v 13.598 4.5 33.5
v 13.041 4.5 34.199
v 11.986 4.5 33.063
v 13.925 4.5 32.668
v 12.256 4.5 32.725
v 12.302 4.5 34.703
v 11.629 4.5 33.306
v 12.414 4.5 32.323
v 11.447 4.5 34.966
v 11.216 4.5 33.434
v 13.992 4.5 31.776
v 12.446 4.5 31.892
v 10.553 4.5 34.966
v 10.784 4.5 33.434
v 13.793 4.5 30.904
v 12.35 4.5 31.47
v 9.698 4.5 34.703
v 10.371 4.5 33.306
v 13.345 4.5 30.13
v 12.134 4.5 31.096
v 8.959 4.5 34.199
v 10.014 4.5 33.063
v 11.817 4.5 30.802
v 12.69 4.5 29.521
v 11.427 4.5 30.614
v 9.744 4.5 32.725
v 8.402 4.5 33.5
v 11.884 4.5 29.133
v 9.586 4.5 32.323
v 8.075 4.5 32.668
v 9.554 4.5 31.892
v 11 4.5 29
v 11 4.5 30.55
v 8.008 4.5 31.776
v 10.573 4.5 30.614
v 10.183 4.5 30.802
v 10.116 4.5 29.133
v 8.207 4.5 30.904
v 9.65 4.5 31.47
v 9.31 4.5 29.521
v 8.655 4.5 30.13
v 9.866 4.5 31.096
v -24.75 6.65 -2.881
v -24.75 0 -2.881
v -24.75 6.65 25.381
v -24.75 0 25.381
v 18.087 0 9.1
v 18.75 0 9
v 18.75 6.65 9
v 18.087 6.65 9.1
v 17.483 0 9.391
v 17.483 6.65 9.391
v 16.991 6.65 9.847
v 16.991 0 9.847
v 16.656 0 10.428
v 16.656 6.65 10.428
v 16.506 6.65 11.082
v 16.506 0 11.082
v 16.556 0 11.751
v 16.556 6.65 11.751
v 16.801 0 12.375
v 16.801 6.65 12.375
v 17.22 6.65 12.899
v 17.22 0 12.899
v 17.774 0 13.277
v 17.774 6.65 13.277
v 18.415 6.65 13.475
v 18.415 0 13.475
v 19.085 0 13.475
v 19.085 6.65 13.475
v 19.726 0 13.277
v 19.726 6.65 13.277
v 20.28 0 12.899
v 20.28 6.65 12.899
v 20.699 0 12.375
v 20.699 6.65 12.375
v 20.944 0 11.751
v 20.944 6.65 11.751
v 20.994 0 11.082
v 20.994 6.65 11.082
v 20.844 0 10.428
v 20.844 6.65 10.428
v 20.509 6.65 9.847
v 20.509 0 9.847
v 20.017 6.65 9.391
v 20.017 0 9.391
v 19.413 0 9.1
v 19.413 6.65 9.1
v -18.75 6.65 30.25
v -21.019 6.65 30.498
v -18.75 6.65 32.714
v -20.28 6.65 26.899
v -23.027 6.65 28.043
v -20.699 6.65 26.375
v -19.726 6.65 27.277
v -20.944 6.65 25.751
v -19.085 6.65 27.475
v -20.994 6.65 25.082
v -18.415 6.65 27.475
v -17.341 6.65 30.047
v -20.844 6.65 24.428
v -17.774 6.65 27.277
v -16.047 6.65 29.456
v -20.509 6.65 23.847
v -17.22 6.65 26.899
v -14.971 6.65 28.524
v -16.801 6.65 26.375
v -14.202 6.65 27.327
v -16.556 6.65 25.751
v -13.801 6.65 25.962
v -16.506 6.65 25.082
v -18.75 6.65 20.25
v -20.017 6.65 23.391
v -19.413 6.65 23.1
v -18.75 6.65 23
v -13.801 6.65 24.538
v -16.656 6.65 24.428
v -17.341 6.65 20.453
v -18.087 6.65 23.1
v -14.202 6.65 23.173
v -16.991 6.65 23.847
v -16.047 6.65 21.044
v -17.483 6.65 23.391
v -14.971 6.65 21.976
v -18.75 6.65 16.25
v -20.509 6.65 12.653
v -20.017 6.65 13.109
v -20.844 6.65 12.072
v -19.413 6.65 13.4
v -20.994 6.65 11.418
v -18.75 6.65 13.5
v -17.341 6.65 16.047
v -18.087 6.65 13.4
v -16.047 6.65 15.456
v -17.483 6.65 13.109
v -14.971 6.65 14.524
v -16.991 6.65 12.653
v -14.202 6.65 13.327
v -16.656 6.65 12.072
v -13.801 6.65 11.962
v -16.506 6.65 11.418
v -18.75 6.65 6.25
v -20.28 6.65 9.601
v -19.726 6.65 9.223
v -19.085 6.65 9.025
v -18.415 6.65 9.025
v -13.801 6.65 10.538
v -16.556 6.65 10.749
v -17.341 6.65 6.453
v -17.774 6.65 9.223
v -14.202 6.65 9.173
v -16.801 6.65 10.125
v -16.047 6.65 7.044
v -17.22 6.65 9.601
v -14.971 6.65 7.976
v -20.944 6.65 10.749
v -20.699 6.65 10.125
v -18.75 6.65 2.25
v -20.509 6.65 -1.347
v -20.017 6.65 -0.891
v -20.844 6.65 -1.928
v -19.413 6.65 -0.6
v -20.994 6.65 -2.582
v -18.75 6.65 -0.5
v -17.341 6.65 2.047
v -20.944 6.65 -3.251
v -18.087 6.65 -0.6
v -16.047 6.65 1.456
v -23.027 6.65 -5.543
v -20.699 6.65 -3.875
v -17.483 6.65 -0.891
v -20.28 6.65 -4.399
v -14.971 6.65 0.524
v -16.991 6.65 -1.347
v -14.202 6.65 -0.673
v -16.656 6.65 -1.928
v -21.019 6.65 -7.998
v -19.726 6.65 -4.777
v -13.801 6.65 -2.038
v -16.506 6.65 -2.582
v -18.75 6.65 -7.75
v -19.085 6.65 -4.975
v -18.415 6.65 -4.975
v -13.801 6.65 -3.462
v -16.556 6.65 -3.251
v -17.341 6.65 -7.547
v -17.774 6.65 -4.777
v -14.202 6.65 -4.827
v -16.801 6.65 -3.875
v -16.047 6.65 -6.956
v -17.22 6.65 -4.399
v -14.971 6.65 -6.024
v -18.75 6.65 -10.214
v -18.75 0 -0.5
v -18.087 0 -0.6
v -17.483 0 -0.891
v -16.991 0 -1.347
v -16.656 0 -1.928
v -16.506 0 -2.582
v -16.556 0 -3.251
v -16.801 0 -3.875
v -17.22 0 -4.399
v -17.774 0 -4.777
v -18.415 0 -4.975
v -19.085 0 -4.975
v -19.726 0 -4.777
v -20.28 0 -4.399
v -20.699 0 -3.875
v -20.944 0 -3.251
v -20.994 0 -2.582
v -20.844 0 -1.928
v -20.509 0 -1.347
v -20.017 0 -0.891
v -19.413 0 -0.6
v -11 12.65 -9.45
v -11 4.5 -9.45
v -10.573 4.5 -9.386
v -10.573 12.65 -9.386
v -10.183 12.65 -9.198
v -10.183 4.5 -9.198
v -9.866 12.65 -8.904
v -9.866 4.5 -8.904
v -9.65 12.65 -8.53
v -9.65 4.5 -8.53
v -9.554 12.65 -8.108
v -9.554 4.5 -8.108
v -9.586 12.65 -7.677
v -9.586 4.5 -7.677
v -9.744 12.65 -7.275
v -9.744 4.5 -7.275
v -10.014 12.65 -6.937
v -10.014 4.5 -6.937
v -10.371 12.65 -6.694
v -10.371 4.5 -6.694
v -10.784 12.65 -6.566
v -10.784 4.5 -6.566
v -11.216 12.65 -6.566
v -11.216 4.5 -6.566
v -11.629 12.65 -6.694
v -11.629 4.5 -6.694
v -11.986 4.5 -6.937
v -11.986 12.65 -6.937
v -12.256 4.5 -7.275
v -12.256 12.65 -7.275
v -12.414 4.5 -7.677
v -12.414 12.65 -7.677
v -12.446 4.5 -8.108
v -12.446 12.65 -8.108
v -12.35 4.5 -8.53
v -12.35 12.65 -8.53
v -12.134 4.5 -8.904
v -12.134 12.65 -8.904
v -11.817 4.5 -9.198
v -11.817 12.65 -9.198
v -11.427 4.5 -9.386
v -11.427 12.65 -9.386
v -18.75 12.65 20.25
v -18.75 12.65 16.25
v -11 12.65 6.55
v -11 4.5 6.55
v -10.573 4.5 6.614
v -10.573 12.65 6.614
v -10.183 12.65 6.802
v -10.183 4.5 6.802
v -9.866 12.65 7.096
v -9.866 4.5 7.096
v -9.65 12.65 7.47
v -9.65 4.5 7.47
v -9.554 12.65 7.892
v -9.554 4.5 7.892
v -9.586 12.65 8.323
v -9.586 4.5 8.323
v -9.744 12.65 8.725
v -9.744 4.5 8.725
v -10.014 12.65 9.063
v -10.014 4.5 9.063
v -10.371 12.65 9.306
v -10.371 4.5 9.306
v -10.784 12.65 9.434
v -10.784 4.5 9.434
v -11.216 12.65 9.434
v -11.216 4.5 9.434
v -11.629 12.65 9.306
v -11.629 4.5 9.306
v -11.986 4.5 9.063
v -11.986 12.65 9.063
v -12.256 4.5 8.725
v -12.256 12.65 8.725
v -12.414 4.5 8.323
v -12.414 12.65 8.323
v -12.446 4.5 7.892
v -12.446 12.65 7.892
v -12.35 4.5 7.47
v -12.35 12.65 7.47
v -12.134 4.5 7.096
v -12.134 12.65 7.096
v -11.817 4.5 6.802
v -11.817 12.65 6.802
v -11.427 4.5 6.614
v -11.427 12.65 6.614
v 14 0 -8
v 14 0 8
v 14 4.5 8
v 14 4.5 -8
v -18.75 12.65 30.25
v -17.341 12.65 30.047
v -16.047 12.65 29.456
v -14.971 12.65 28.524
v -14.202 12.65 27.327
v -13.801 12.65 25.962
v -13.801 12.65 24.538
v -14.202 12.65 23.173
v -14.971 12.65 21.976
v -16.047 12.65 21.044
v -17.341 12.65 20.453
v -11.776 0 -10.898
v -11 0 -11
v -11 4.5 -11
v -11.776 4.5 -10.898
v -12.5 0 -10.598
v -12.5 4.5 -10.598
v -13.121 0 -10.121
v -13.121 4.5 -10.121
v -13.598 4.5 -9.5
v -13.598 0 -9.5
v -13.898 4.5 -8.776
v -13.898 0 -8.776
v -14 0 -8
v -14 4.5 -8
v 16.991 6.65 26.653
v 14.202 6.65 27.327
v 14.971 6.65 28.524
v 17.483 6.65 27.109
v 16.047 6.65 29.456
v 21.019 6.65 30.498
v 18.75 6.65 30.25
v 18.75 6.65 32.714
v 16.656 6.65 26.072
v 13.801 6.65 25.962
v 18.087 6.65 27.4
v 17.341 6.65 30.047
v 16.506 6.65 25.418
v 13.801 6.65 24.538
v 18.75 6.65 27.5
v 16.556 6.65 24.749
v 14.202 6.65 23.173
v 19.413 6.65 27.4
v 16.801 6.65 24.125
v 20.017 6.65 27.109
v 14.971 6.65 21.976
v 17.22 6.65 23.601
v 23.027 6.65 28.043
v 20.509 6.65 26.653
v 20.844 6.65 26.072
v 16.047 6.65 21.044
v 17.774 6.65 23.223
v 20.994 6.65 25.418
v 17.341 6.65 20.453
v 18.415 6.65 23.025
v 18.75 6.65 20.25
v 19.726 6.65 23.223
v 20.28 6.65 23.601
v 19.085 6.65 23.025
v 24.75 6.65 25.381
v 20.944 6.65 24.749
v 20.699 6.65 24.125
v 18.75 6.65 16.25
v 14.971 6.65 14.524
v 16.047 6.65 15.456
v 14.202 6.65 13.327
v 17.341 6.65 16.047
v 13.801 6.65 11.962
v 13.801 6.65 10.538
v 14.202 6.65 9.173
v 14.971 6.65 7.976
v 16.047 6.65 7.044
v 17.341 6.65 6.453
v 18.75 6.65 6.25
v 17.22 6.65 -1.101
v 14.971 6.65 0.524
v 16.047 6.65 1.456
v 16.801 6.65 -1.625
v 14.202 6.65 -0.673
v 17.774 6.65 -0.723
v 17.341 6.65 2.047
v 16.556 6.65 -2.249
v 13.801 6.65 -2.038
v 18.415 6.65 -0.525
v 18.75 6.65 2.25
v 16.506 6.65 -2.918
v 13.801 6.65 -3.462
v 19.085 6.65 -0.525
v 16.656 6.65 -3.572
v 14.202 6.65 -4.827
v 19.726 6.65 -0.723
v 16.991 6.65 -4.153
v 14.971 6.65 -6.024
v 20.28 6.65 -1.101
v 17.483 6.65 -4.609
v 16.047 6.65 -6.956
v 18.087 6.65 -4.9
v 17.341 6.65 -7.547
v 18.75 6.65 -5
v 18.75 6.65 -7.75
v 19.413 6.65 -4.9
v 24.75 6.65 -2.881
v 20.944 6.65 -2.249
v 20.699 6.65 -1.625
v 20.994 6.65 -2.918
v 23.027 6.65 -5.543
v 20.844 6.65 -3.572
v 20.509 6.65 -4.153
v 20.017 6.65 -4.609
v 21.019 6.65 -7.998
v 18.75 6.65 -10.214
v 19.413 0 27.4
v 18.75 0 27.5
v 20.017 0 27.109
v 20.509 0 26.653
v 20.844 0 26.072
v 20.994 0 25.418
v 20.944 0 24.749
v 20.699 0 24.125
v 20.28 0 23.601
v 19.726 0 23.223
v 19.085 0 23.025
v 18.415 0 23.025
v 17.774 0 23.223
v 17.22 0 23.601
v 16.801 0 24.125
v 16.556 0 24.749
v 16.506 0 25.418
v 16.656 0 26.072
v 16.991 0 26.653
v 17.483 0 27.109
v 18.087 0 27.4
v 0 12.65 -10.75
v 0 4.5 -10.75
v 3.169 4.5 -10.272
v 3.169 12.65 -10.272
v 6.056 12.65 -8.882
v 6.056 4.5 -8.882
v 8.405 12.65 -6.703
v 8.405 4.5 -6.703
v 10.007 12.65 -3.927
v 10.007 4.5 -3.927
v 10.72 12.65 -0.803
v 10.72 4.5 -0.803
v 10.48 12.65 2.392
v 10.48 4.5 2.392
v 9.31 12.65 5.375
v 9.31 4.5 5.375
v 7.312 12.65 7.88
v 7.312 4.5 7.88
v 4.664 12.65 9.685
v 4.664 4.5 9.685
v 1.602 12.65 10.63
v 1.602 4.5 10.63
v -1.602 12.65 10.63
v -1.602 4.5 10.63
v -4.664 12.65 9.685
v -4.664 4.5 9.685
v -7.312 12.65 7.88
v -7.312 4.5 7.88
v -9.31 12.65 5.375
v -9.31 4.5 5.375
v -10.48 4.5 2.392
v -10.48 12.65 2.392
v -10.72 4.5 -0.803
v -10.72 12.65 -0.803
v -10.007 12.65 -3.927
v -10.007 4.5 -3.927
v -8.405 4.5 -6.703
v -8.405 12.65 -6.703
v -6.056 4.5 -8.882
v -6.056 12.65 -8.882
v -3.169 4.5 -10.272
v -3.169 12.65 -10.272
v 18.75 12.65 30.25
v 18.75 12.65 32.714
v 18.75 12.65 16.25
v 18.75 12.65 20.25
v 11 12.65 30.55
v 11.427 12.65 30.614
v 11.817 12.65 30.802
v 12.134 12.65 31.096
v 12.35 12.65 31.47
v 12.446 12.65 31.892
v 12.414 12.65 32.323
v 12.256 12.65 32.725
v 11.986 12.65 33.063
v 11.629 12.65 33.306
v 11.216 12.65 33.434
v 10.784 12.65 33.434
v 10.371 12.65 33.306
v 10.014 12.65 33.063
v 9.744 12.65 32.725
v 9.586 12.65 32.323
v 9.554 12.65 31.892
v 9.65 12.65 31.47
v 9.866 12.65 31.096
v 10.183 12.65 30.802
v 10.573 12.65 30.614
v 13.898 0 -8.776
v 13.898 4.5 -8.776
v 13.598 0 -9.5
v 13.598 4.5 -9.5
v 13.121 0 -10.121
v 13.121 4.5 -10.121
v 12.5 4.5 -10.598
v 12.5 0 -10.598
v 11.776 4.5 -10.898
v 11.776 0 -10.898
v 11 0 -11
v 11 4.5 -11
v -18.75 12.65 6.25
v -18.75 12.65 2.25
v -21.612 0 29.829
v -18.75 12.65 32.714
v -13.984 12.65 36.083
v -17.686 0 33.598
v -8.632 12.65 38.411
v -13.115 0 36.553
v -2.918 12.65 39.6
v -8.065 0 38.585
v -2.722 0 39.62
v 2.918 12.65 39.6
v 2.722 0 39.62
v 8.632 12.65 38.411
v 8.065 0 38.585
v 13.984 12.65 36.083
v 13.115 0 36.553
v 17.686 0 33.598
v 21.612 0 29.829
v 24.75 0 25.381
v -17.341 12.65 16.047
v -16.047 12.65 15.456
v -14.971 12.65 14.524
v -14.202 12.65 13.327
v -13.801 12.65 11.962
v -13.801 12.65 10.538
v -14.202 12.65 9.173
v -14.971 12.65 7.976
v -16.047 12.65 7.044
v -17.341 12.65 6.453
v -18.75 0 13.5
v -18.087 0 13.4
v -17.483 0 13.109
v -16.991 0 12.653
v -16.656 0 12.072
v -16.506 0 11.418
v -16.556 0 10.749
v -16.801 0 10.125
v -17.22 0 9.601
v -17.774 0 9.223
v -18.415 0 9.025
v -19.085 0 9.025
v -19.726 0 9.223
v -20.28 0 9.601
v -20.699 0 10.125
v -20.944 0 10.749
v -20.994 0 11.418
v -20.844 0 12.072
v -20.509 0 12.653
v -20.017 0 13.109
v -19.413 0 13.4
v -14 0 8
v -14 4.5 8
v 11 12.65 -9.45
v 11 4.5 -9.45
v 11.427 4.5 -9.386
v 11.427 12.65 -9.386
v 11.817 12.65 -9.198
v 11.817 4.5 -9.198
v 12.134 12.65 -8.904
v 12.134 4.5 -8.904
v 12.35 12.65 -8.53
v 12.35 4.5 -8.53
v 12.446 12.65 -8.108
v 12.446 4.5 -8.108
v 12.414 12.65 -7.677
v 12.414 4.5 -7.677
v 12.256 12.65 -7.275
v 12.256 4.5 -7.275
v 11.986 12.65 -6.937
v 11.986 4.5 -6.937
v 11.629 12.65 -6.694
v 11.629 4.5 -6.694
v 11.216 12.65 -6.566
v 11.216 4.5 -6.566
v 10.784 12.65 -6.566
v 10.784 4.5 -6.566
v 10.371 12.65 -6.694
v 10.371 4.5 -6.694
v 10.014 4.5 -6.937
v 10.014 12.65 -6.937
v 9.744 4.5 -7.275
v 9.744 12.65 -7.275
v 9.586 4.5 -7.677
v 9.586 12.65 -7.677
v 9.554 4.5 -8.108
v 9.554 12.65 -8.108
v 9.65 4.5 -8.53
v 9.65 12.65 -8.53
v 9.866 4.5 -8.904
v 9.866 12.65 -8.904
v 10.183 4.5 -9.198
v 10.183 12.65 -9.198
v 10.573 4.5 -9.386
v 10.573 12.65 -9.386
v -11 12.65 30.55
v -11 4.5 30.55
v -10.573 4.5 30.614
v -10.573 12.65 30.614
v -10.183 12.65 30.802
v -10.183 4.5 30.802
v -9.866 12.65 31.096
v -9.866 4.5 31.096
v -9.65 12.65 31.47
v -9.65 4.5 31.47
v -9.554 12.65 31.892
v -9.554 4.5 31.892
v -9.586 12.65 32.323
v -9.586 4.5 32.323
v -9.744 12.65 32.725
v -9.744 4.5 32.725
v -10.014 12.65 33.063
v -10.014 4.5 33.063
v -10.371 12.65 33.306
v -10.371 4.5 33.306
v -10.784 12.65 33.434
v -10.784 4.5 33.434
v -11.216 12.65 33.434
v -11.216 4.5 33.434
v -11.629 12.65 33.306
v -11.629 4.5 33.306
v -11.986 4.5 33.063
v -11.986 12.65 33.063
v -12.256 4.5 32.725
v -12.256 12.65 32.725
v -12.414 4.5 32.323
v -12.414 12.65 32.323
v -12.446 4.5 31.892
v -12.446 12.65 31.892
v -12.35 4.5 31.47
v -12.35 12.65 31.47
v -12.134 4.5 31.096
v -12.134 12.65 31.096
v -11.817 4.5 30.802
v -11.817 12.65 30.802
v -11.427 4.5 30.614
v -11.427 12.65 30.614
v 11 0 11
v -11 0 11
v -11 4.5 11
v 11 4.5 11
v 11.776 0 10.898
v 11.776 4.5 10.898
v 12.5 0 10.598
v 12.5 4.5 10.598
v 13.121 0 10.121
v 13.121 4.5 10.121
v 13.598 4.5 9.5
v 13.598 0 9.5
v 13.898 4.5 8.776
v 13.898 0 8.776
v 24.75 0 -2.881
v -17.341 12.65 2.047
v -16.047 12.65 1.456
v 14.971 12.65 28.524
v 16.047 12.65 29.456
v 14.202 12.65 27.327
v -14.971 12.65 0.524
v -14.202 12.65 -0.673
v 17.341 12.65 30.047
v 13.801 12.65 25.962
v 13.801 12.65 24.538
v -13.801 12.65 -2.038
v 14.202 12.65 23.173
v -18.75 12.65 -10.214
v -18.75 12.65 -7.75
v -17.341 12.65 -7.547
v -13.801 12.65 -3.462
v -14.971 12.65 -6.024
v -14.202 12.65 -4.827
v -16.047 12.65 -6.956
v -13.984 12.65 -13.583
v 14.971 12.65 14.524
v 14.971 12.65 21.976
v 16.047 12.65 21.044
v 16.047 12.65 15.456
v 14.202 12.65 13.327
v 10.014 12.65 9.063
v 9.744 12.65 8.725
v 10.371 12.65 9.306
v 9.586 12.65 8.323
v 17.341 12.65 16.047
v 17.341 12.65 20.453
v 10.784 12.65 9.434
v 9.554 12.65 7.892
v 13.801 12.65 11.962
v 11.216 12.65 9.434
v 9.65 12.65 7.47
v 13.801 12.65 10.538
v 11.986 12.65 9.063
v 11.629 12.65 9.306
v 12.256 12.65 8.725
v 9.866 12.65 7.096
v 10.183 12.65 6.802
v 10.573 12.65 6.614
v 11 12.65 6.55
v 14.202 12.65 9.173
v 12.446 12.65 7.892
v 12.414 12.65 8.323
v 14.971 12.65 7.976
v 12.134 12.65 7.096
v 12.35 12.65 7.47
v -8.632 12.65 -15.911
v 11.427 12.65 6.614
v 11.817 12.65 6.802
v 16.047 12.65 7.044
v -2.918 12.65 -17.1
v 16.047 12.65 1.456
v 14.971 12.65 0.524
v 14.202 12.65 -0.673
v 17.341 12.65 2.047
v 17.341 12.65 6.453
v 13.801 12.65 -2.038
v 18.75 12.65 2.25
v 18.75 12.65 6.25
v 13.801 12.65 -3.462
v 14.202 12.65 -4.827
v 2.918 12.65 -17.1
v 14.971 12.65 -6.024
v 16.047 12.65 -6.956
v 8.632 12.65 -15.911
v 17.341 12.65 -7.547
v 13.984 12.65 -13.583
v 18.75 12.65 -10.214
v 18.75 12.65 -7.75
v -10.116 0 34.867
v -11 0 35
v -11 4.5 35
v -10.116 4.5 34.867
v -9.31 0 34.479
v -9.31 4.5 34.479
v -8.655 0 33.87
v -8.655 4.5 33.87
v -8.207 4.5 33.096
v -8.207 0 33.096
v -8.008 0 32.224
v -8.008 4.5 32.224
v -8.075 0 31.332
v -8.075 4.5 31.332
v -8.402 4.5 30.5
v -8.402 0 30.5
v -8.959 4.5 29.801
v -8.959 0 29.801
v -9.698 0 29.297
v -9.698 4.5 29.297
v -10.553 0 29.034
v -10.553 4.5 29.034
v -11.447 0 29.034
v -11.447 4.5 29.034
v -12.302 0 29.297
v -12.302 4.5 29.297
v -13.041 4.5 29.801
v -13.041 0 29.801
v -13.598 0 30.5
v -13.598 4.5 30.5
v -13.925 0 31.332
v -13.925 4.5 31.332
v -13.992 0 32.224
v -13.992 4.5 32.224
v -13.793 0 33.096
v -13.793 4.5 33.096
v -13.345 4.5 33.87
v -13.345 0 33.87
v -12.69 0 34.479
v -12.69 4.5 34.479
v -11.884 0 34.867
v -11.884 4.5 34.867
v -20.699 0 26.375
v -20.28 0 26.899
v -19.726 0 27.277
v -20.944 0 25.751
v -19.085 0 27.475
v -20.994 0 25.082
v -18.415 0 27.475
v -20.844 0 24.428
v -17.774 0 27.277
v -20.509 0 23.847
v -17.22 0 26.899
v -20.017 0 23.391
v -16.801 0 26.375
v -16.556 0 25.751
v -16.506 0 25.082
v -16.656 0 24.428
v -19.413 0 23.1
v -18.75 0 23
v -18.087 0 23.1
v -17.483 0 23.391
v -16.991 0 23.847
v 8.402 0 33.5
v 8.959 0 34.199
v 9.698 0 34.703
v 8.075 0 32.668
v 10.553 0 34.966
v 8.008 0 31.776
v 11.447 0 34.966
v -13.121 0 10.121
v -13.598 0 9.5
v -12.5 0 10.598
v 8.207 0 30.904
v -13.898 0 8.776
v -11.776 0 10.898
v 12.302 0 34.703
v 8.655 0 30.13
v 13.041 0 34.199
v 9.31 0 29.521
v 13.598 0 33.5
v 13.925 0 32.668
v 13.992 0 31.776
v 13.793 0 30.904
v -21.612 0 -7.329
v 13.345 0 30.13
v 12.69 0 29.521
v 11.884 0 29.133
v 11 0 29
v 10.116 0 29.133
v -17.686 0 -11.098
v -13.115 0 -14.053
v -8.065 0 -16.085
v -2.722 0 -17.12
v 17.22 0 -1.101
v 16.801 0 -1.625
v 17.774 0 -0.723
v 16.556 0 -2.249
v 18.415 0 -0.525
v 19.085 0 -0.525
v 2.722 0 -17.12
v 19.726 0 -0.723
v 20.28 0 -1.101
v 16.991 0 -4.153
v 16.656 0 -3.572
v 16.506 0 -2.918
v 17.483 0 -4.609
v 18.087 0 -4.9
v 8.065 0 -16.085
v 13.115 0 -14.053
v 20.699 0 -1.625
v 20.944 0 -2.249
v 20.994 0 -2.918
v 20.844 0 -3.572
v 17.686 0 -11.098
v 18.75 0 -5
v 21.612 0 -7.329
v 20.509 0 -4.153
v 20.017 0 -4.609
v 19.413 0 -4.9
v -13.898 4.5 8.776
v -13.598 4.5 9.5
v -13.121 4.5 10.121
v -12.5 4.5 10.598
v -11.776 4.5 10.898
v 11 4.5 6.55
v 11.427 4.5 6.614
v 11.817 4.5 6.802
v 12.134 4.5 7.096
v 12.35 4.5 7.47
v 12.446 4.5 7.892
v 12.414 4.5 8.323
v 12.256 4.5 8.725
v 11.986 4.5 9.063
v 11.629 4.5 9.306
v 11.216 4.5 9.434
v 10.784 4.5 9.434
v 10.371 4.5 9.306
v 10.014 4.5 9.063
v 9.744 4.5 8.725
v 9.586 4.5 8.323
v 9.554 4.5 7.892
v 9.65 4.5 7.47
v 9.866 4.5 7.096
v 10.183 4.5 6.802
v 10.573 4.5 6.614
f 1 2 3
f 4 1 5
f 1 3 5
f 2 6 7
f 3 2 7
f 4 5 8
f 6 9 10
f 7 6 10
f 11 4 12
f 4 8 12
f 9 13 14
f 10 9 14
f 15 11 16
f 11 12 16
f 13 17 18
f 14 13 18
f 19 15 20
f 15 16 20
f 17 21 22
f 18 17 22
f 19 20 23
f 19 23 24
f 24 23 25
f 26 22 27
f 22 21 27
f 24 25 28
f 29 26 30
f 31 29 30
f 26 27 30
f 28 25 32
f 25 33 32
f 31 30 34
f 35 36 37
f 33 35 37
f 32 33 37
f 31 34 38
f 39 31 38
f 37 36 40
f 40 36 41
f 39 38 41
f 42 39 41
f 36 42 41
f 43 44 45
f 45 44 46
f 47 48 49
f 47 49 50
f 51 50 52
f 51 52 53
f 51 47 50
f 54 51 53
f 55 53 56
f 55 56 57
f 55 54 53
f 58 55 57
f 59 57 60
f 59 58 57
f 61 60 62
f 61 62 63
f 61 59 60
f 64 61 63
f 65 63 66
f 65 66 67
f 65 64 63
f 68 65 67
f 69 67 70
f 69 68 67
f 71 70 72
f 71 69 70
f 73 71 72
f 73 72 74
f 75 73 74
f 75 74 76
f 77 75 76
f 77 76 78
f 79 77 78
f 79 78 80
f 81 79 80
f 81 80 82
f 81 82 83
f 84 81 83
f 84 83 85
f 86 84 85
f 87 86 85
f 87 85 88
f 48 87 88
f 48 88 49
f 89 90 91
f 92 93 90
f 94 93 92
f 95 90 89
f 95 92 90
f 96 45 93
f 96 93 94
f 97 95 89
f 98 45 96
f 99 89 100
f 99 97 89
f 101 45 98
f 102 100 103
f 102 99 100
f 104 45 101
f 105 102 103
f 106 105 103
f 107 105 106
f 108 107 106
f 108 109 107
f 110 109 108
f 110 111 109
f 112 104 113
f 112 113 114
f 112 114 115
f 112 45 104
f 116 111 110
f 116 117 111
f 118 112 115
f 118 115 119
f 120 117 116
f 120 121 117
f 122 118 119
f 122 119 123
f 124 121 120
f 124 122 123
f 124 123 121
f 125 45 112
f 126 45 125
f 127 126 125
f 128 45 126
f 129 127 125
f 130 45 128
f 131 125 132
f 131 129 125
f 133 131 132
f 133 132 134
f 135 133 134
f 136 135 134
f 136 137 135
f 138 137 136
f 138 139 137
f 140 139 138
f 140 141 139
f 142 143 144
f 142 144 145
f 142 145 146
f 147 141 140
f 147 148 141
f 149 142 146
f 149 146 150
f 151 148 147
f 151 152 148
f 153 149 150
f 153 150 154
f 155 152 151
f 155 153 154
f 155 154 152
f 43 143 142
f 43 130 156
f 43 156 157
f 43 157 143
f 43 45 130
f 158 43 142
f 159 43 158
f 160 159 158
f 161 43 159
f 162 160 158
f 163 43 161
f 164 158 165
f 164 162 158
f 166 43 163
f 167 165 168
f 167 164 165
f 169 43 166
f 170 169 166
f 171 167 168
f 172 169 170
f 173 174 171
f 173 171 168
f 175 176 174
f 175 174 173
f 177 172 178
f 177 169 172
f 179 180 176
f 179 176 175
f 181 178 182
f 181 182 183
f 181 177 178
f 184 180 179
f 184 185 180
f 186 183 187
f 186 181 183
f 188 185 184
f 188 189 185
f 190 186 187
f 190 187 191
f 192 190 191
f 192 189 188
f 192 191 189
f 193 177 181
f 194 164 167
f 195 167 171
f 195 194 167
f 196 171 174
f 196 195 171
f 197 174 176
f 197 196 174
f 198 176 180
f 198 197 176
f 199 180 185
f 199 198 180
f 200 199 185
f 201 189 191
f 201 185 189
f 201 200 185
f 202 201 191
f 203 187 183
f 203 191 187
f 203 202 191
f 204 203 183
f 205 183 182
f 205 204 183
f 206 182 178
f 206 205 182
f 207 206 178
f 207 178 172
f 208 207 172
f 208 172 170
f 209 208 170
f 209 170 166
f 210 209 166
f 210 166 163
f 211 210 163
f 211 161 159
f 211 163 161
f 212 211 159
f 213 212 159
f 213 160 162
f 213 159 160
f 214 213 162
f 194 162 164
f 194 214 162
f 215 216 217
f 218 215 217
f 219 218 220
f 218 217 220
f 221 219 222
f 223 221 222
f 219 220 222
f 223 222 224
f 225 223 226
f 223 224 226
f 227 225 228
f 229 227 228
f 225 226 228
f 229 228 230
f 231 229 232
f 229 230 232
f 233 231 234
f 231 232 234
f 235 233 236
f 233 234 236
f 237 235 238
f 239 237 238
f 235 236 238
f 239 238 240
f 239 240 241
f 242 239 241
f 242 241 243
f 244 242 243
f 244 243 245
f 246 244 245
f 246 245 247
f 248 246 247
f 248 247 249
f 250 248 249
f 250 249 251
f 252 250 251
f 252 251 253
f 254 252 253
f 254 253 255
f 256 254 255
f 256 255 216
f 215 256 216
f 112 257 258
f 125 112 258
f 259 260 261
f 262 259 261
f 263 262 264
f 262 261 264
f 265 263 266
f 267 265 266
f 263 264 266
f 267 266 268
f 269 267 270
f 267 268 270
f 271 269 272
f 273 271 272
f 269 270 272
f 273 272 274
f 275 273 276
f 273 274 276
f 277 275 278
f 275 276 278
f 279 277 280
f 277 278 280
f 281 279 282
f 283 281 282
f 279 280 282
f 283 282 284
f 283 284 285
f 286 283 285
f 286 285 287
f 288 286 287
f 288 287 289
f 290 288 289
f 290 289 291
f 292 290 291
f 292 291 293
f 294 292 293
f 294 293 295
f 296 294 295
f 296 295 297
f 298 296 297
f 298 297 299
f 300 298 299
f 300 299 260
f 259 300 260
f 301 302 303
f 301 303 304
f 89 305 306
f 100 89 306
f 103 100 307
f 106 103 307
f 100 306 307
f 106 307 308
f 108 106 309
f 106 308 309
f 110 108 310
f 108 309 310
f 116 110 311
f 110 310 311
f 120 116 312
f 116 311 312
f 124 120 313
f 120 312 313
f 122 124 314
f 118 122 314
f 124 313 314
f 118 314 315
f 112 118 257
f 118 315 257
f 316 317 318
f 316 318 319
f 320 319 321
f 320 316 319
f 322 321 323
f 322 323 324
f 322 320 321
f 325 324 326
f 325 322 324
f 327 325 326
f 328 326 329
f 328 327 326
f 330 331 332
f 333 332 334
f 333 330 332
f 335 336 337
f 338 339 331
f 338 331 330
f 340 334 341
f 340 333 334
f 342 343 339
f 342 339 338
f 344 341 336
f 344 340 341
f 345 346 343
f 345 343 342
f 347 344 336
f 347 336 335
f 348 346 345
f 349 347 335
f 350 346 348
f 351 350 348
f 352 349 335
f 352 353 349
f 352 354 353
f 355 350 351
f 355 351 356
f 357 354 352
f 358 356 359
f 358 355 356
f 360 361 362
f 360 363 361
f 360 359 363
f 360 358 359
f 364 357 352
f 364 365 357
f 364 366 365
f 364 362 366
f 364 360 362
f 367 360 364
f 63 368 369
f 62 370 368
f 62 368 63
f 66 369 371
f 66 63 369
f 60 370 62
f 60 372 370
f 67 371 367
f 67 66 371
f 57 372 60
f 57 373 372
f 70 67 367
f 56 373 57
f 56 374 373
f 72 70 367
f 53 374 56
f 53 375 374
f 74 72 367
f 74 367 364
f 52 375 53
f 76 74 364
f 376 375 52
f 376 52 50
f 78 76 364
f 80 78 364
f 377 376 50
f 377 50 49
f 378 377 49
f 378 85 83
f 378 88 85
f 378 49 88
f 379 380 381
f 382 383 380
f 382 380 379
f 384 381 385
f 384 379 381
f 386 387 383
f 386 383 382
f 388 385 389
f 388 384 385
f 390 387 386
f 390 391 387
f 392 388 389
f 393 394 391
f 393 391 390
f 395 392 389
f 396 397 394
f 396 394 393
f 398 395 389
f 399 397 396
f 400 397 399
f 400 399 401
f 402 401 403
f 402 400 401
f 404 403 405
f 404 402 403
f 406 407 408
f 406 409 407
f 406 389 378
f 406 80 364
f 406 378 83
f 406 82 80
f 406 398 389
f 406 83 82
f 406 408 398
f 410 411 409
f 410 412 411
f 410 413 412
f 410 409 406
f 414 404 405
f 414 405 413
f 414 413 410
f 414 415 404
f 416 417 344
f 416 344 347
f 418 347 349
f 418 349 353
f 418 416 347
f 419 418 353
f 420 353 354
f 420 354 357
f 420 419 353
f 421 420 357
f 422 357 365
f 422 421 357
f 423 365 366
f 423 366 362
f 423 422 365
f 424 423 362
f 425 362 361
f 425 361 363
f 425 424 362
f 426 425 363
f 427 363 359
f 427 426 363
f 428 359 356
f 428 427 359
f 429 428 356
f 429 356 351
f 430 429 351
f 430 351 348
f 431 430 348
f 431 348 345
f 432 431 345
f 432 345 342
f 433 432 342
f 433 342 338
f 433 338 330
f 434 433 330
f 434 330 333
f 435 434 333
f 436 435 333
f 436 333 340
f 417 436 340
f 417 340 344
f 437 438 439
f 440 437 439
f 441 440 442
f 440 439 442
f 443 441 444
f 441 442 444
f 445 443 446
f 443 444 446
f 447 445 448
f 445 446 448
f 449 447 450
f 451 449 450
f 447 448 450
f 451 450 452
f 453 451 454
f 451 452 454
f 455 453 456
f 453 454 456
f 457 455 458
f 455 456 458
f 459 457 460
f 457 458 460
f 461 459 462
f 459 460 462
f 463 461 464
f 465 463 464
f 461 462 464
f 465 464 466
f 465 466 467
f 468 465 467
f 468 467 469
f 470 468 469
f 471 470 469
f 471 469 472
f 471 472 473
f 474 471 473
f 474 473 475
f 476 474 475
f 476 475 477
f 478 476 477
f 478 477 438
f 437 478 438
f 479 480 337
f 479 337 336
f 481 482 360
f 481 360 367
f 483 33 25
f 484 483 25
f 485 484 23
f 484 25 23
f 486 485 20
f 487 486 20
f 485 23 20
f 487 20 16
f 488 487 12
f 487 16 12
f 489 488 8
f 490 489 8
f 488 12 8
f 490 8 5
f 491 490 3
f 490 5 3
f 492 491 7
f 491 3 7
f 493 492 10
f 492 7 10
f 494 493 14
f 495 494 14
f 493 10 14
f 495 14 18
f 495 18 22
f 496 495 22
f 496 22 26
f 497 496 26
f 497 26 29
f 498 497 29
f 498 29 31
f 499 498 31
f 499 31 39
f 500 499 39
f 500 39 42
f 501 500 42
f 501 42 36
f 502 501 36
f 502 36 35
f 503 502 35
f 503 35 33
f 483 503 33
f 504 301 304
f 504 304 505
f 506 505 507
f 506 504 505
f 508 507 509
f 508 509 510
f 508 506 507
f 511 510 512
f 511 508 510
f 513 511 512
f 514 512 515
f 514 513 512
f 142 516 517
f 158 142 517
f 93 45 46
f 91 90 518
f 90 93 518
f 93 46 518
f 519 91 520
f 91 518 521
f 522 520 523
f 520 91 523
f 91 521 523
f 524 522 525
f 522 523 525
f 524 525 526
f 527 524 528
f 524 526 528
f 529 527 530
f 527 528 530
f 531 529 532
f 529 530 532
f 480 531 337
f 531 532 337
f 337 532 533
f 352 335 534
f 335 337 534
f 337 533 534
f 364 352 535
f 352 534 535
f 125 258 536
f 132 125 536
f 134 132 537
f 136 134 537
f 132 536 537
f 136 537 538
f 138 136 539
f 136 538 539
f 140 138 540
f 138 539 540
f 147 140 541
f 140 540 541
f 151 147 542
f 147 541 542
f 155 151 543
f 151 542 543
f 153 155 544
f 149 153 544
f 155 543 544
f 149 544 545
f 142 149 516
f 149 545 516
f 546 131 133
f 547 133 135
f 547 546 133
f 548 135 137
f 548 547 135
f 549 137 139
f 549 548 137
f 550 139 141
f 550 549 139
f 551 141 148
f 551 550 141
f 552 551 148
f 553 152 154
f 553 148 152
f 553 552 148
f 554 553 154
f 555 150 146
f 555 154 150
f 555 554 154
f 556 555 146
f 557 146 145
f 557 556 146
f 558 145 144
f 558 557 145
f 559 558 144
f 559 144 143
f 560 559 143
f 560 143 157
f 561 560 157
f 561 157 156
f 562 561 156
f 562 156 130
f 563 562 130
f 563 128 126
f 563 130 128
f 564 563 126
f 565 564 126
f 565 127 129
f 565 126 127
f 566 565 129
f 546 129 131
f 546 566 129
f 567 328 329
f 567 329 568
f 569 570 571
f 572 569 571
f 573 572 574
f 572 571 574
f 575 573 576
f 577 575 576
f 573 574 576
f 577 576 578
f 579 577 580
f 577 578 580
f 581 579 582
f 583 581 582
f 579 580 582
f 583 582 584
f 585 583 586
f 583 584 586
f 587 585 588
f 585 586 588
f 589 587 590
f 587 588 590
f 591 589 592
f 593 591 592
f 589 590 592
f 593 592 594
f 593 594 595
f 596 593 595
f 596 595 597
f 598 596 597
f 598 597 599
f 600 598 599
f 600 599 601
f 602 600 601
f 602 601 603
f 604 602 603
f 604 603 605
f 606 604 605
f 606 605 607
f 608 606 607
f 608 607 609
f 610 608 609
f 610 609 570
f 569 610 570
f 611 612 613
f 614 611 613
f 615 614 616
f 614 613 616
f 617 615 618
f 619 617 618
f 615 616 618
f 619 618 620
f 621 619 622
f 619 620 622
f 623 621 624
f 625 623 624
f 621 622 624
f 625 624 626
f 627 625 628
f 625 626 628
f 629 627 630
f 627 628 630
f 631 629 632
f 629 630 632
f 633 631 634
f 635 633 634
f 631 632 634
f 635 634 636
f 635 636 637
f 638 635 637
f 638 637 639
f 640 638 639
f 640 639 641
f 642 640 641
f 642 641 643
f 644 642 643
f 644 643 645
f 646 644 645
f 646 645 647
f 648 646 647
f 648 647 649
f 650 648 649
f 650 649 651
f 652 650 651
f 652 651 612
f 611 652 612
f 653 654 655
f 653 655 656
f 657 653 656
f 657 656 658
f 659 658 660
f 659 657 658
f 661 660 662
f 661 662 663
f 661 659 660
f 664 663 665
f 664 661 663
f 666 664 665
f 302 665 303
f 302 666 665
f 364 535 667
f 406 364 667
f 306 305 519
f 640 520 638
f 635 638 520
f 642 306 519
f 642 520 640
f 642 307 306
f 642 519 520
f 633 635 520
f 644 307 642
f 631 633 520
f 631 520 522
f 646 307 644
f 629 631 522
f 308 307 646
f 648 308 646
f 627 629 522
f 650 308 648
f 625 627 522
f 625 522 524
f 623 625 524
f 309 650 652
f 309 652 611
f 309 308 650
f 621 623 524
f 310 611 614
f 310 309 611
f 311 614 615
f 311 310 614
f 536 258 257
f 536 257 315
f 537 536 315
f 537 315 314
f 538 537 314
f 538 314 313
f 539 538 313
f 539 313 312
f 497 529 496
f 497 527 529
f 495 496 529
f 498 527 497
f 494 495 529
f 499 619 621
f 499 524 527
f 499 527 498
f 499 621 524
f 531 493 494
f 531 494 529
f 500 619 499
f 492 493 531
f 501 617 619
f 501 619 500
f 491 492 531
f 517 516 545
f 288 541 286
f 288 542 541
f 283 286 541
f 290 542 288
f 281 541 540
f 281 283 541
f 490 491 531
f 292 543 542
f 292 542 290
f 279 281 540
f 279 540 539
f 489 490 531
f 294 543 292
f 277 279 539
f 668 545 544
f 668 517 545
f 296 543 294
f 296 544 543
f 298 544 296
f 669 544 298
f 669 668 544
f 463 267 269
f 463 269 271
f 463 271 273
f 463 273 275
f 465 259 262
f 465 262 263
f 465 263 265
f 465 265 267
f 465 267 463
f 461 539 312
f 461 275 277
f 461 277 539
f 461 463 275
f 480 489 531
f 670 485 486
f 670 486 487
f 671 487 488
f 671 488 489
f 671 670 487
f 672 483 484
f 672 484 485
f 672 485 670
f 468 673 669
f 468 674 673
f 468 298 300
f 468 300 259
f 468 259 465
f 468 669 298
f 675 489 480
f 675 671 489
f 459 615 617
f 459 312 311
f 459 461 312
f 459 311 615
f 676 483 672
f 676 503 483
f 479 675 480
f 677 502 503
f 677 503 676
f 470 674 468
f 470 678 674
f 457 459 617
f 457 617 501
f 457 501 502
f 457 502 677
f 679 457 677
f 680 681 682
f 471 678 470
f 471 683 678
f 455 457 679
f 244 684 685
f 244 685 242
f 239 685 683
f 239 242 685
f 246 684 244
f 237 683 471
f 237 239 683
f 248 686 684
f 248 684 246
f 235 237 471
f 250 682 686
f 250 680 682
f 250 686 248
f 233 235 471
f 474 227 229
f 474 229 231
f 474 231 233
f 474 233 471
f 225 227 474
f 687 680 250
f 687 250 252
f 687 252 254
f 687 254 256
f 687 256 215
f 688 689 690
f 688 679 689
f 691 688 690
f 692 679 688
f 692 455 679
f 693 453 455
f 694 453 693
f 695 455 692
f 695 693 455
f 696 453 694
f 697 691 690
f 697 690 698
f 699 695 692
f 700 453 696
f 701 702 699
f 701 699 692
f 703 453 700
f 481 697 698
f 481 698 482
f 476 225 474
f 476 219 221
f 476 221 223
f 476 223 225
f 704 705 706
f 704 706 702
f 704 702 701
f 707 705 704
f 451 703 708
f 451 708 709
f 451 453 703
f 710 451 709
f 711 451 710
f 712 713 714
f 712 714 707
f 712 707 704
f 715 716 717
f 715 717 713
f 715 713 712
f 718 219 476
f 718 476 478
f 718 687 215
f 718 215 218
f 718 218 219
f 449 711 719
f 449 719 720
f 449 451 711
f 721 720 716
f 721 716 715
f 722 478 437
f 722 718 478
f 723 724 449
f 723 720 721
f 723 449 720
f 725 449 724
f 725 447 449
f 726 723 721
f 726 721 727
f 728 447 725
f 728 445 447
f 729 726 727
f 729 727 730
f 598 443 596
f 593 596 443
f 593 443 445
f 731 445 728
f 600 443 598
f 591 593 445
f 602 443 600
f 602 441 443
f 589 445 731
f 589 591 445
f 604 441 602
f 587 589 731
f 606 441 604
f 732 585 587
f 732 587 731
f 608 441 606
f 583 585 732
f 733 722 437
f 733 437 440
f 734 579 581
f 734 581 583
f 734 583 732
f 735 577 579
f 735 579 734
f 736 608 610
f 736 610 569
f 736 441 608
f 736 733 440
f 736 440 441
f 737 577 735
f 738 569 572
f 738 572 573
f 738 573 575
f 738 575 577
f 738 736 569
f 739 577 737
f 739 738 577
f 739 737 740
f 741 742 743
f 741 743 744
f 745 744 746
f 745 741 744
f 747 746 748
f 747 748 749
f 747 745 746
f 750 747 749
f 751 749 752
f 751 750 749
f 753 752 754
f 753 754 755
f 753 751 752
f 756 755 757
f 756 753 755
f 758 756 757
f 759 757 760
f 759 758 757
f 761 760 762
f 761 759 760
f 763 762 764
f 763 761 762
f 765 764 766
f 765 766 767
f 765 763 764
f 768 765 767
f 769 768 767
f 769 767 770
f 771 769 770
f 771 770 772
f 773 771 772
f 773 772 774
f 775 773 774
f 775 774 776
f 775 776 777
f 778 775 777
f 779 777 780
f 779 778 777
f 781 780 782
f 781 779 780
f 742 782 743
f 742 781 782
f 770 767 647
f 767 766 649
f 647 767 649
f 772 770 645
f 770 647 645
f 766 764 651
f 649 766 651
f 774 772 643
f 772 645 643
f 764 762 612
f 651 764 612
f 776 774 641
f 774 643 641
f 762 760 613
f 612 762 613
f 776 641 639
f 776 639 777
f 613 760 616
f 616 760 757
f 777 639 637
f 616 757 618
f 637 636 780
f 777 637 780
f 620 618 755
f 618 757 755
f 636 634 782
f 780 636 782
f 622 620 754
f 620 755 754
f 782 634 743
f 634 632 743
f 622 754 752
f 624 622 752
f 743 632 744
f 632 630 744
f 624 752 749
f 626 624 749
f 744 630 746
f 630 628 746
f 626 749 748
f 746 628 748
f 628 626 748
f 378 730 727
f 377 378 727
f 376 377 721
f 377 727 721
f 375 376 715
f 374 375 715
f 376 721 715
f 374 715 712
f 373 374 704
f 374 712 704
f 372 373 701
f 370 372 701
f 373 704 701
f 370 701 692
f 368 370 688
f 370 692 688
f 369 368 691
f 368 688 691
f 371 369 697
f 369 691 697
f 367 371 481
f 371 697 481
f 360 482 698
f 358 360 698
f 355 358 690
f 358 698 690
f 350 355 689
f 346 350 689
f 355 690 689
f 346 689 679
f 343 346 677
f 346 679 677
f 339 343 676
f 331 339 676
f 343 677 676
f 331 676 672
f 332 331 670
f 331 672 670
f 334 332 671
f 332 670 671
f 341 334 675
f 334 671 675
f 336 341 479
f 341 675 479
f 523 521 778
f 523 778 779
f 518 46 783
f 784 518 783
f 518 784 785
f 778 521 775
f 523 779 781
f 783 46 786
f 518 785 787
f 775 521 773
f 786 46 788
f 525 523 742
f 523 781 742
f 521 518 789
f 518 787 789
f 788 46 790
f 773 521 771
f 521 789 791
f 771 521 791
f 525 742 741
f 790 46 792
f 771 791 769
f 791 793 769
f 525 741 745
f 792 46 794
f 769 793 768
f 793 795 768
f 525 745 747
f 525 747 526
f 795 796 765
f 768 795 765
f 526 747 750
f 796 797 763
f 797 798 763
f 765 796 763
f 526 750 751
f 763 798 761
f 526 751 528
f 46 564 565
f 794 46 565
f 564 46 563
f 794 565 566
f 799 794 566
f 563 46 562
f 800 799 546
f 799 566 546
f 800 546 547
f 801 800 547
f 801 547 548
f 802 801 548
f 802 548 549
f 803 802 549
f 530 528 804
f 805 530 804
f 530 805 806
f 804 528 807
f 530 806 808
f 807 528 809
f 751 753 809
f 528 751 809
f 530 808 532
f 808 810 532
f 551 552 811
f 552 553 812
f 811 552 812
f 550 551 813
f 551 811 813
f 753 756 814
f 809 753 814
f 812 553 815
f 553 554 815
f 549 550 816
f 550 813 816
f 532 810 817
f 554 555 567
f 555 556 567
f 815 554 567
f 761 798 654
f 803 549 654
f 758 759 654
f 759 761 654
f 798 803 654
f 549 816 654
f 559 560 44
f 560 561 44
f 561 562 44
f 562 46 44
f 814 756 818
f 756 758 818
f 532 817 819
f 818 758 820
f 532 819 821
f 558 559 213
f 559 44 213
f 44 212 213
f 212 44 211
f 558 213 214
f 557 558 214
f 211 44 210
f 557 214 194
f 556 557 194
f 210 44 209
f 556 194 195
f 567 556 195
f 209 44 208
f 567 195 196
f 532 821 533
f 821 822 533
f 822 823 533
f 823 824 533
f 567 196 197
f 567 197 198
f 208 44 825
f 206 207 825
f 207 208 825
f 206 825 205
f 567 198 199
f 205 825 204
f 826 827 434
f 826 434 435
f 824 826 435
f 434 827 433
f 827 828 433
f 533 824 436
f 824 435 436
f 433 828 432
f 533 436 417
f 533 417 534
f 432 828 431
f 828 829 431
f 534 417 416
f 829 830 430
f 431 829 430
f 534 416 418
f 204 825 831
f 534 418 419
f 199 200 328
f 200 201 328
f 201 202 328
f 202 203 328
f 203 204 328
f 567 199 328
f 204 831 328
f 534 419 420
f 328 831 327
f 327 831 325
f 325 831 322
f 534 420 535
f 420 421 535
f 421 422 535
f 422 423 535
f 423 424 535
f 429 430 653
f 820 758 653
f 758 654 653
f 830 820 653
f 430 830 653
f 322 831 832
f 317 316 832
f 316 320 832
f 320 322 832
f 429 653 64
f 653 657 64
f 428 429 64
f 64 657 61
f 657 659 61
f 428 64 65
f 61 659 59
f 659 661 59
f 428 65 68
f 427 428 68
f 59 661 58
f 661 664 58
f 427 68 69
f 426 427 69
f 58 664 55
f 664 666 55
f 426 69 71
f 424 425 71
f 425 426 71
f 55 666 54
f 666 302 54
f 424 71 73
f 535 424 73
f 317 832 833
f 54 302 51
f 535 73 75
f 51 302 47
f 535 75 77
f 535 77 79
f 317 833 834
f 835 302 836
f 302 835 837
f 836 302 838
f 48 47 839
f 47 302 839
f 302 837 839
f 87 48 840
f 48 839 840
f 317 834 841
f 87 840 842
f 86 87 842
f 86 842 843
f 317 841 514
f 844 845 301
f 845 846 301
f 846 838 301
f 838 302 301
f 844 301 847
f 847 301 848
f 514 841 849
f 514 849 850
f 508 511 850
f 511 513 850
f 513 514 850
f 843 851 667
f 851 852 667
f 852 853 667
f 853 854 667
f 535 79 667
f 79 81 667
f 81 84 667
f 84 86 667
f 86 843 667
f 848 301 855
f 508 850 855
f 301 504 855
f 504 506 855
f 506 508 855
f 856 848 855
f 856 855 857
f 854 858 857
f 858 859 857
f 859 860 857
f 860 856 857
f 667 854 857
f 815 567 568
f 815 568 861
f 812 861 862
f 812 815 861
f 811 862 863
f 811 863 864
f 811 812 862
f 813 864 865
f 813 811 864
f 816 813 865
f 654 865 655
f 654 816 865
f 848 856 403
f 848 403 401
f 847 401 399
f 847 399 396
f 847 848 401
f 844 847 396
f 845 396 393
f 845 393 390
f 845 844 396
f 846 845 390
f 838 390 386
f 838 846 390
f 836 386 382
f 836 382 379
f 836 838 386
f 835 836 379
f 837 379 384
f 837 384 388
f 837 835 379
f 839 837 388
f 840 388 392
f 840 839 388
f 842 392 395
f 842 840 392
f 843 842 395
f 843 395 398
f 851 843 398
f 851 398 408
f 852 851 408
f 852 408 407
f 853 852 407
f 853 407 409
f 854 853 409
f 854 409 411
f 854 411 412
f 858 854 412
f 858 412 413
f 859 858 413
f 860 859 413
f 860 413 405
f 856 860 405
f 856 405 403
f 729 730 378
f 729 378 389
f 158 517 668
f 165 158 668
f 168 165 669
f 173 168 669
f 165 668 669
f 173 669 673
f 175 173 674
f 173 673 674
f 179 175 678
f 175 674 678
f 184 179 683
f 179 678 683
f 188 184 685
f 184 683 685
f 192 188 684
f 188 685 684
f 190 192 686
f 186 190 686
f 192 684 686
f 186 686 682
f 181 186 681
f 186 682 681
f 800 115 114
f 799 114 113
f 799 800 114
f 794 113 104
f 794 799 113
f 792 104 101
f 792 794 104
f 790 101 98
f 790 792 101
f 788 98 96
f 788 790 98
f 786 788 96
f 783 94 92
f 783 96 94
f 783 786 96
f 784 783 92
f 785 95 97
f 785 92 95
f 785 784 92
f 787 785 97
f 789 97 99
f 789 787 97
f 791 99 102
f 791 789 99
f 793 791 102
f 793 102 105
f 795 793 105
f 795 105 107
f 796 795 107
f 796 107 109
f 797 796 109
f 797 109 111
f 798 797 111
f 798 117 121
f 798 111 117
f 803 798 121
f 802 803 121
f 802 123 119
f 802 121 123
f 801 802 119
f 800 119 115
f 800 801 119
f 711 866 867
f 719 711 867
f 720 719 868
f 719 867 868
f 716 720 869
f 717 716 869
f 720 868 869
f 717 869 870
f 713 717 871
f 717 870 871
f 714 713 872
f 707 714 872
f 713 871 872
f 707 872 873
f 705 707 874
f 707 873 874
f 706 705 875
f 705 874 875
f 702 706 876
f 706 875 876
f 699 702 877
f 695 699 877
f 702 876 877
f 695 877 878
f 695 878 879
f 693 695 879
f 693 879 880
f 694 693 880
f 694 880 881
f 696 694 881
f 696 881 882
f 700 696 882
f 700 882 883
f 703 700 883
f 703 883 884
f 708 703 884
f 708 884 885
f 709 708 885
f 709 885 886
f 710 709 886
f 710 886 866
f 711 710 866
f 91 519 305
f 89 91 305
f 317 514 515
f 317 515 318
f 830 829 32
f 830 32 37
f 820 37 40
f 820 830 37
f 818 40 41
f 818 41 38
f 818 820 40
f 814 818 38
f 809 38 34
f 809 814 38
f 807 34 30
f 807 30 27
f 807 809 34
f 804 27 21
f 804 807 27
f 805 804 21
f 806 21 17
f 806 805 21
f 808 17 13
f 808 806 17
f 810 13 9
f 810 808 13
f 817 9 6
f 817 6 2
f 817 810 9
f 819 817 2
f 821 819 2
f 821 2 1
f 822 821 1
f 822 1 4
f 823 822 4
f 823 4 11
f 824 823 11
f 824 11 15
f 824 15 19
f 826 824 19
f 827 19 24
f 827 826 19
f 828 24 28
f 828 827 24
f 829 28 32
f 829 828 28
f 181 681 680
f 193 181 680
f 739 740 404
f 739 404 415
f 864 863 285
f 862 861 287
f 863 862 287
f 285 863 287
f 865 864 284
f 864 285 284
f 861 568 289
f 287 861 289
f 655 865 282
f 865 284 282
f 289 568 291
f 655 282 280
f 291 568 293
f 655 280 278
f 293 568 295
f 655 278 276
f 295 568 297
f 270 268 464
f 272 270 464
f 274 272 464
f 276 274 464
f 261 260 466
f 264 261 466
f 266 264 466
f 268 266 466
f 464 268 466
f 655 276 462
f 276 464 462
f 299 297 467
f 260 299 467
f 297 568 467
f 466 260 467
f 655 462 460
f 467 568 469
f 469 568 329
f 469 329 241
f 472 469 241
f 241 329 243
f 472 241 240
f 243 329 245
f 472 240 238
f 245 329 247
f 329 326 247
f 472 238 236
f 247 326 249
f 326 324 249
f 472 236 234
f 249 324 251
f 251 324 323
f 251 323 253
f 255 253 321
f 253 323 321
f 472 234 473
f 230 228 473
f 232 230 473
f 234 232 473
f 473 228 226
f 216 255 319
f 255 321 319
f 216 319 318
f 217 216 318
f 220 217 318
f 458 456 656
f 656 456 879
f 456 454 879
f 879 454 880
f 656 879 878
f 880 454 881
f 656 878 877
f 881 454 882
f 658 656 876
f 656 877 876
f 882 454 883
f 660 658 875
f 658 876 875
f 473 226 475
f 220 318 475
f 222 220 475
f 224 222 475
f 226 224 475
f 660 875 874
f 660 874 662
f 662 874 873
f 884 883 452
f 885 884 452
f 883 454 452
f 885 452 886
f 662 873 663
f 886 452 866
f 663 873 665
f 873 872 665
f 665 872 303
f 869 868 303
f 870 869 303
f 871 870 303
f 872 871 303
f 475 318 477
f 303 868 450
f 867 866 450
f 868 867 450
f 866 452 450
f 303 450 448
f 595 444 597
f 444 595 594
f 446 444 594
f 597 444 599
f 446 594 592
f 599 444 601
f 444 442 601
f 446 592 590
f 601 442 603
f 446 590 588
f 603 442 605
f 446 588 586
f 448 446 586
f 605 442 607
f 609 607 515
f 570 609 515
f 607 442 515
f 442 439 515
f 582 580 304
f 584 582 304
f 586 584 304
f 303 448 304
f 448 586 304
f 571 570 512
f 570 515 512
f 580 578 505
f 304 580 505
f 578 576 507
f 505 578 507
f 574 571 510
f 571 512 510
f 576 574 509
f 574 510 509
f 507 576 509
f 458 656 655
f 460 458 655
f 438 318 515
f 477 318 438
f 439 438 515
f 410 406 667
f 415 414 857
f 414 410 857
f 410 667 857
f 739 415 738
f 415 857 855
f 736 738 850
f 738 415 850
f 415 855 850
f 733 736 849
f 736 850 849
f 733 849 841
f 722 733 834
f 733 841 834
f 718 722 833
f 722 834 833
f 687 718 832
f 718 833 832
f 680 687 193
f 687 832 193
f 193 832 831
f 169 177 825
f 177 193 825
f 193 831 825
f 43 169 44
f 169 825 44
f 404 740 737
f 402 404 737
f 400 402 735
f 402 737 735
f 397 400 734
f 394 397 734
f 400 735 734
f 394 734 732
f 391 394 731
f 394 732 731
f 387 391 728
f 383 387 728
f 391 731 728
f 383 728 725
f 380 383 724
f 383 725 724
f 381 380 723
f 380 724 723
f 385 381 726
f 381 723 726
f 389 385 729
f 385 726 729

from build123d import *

# Parameters (mm, degrees)
SCHIZZO3_R                   = 2.25
ESTRUSIONE_ESTRUSIONE1_DEPTH = 12.65
SCHIZZO1_R                   = 3
TAGLIO_ESTRUSIONE1_DEPTH     = 4.5
SCHIZZO4_R                   = 10.75
SCHIZZO4_R_2                 = 1.45
TAGLIO_ESTRUSIONE2_DEPTH     = 48.529438246
SCHIZZO6_R                   = 5
TAGLIO_ESTRUSIONE3_DEPTH     = 6
SCHIZZO7_W                   = 16
SCHIZZO7_H                   = 77
TAGLIO_ESTRUSIONE4_DEPTH     = 6


with BuildPart() as part:
    # Schizzo3 → Estrusione-Estrusione1 (new body)
    with BuildSketch(Plane(origin=(0, 0, 0), x_dir=(1, 0, 0), z_dir=(0, 1, 0))):
        with BuildLine():
            Line((-24.75, 2.881082761), (-24.75, -25.381082761))
            ThreePointArc((-24.75, -25.381082761), (0, -39.75), (24.75, -25.381082761))
            Line((24.75, -25.381082761), (24.75, 2.881082761))
            ThreePointArc((24.75, 2.881082761), (0, 17.25), (-24.75, 2.881082761))
        make_face()
        with Locations(Location((-18.75, 2.75, 0), (0, 0, 270))):
            Circle(SCHIZZO3_R, mode=Mode.SUBTRACT)
        with Locations(Location((18.75, 2.75, 0), (0, 0, 90))):
            Circle(SCHIZZO3_R, mode=Mode.SUBTRACT)
        with Locations(Location((18.75, -25.25, 0), (0, 0, 270))):
            Circle(SCHIZZO3_R, mode=Mode.SUBTRACT)
        with Locations(Location((-18.75, -25.25, 0), (0, 0, 90))):
            Circle(SCHIZZO3_R, mode=Mode.SUBTRACT)
        with Locations(Location((-18.75, -11.25, 0), (0, 0, 270))):
            Circle(SCHIZZO3_R, mode=Mode.SUBTRACT)
        with Locations(Location((18.75, -11.25, 0), (0, 0, 90))):
            Circle(SCHIZZO3_R, mode=Mode.SUBTRACT)
    extrude(amount=ESTRUSIONE_ESTRUSIONE1_DEPTH)

    # Schizzo1 → Taglio-Estrusione1 (cut)
    with BuildSketch(Plane(origin=(0, 0, 0), x_dir=(1, 0, 0), z_dir=(0, 1, 0))):
        with Locations(Location((-11, -32, 0), (0, 0, 270))):
            Circle(SCHIZZO1_R)
        with Locations(Location((11, -32, 0), (0, 0, 90))):
            Circle(SCHIZZO1_R)
        with BuildLine():
            Line((-14, 8), (-14, -8))
            ThreePointArc((-14, -8), (-13.121320344, -10.121320344), (-11, -11))
            Line((-11, -11), (0, -11))
            Line((0, -11), (11, -11))
            ThreePointArc((11, -11), (13.121320344, -10.121320344), (14, -8))
            Line((14, -8), (14, 8))
            ThreePointArc((14, 8), (13.121320344, 10.121320344), (11, 11))
            Line((11, 11), (0, 11))
            Line((0, 11), (-11, 11))
            ThreePointArc((-11, 11), (-13.121320344, 10.121320344), (-14, 8))
        make_face()
    extrude(amount=TAGLIO_ESTRUSIONE1_DEPTH, mode=Mode.SUBTRACT)

    # Schizzo4 → Taglio-Estrusione2 (cut, through all)
    with BuildSketch(Plane.XZ.offset(-4.5)):
        with Locations(Location((0, 0, 0), (0, 0, 270))):
            Circle(SCHIZZO4_R)
        with Locations(Location((-11, 8, 0), (0, 0, 270))):
            Circle(SCHIZZO4_R_2)
        with Locations(Location((-11, -8, 0), (0, 0, 270))):
            Circle(SCHIZZO4_R_2)
        with Locations(Location((11, -8, 0), (0, 0, 270))):
            Circle(SCHIZZO4_R_2)
        with Locations(Location((11, 8, 0), (0, 0, 270))):
            Circle(SCHIZZO4_R_2)
        with Locations(Location((-11, 32, 0), (0, 0, 270))):
            Circle(SCHIZZO4_R_2)
        with Locations(Location((11, 32, 0), (0, 0, 270))):
            Circle(SCHIZZO4_R_2)
    extrude(amount=-TAGLIO_ESTRUSIONE2_DEPTH, mode=Mode.SUBTRACT)

    # Schizzo6 → Taglio-Estrusione3 (cut)
    with BuildSketch(Plane(origin=(0, 12.65, 0), x_dir=(1, 0, 0), z_dir=(0, 1, 0))):
        with Locations(Location((-18.75, 2.75, 0), (0, 0, 270))):
            Circle(SCHIZZO6_R)
        with Locations(Location((-18.75, -11.25, 0), (0, 0, 270))):
            Circle(SCHIZZO6_R)
        with Locations(Location((-18.75, -25.25, 0), (0, 0, 270))):
            Circle(SCHIZZO6_R)
        with Locations(Location((18.75, -25.25, 0), (0, 0, 270))):
            Circle(SCHIZZO6_R)
        with Locations(Location((18.75, -11.25, 0), (0, 0, 270))):
            Circle(SCHIZZO6_R)
        with Locations(Location((18.75, 2.75, 0), (0, 0, 270))):
            Circle(SCHIZZO6_R)
    extrude(amount=-TAGLIO_ESTRUSIONE3_DEPTH, mode=Mode.SUBTRACT)

    # Schizzo7 → Taglio-Estrusione4 (cut)
    with BuildSketch(Plane(origin=(0, 12.65, 0), x_dir=(1, 0, 0), z_dir=(0, 1, 0))):
        with Locations((-26.75, -11.25)):
            Rectangle(SCHIZZO7_W, SCHIZZO7_H)
        with Locations((26.75, -11.25)):
            Rectangle(SCHIZZO7_W, SCHIZZO7_H)
    extrude(amount=-TAGLIO_ESTRUSIONE4_DEPTH, mode=Mode.SUBTRACT)


solid = part.part
